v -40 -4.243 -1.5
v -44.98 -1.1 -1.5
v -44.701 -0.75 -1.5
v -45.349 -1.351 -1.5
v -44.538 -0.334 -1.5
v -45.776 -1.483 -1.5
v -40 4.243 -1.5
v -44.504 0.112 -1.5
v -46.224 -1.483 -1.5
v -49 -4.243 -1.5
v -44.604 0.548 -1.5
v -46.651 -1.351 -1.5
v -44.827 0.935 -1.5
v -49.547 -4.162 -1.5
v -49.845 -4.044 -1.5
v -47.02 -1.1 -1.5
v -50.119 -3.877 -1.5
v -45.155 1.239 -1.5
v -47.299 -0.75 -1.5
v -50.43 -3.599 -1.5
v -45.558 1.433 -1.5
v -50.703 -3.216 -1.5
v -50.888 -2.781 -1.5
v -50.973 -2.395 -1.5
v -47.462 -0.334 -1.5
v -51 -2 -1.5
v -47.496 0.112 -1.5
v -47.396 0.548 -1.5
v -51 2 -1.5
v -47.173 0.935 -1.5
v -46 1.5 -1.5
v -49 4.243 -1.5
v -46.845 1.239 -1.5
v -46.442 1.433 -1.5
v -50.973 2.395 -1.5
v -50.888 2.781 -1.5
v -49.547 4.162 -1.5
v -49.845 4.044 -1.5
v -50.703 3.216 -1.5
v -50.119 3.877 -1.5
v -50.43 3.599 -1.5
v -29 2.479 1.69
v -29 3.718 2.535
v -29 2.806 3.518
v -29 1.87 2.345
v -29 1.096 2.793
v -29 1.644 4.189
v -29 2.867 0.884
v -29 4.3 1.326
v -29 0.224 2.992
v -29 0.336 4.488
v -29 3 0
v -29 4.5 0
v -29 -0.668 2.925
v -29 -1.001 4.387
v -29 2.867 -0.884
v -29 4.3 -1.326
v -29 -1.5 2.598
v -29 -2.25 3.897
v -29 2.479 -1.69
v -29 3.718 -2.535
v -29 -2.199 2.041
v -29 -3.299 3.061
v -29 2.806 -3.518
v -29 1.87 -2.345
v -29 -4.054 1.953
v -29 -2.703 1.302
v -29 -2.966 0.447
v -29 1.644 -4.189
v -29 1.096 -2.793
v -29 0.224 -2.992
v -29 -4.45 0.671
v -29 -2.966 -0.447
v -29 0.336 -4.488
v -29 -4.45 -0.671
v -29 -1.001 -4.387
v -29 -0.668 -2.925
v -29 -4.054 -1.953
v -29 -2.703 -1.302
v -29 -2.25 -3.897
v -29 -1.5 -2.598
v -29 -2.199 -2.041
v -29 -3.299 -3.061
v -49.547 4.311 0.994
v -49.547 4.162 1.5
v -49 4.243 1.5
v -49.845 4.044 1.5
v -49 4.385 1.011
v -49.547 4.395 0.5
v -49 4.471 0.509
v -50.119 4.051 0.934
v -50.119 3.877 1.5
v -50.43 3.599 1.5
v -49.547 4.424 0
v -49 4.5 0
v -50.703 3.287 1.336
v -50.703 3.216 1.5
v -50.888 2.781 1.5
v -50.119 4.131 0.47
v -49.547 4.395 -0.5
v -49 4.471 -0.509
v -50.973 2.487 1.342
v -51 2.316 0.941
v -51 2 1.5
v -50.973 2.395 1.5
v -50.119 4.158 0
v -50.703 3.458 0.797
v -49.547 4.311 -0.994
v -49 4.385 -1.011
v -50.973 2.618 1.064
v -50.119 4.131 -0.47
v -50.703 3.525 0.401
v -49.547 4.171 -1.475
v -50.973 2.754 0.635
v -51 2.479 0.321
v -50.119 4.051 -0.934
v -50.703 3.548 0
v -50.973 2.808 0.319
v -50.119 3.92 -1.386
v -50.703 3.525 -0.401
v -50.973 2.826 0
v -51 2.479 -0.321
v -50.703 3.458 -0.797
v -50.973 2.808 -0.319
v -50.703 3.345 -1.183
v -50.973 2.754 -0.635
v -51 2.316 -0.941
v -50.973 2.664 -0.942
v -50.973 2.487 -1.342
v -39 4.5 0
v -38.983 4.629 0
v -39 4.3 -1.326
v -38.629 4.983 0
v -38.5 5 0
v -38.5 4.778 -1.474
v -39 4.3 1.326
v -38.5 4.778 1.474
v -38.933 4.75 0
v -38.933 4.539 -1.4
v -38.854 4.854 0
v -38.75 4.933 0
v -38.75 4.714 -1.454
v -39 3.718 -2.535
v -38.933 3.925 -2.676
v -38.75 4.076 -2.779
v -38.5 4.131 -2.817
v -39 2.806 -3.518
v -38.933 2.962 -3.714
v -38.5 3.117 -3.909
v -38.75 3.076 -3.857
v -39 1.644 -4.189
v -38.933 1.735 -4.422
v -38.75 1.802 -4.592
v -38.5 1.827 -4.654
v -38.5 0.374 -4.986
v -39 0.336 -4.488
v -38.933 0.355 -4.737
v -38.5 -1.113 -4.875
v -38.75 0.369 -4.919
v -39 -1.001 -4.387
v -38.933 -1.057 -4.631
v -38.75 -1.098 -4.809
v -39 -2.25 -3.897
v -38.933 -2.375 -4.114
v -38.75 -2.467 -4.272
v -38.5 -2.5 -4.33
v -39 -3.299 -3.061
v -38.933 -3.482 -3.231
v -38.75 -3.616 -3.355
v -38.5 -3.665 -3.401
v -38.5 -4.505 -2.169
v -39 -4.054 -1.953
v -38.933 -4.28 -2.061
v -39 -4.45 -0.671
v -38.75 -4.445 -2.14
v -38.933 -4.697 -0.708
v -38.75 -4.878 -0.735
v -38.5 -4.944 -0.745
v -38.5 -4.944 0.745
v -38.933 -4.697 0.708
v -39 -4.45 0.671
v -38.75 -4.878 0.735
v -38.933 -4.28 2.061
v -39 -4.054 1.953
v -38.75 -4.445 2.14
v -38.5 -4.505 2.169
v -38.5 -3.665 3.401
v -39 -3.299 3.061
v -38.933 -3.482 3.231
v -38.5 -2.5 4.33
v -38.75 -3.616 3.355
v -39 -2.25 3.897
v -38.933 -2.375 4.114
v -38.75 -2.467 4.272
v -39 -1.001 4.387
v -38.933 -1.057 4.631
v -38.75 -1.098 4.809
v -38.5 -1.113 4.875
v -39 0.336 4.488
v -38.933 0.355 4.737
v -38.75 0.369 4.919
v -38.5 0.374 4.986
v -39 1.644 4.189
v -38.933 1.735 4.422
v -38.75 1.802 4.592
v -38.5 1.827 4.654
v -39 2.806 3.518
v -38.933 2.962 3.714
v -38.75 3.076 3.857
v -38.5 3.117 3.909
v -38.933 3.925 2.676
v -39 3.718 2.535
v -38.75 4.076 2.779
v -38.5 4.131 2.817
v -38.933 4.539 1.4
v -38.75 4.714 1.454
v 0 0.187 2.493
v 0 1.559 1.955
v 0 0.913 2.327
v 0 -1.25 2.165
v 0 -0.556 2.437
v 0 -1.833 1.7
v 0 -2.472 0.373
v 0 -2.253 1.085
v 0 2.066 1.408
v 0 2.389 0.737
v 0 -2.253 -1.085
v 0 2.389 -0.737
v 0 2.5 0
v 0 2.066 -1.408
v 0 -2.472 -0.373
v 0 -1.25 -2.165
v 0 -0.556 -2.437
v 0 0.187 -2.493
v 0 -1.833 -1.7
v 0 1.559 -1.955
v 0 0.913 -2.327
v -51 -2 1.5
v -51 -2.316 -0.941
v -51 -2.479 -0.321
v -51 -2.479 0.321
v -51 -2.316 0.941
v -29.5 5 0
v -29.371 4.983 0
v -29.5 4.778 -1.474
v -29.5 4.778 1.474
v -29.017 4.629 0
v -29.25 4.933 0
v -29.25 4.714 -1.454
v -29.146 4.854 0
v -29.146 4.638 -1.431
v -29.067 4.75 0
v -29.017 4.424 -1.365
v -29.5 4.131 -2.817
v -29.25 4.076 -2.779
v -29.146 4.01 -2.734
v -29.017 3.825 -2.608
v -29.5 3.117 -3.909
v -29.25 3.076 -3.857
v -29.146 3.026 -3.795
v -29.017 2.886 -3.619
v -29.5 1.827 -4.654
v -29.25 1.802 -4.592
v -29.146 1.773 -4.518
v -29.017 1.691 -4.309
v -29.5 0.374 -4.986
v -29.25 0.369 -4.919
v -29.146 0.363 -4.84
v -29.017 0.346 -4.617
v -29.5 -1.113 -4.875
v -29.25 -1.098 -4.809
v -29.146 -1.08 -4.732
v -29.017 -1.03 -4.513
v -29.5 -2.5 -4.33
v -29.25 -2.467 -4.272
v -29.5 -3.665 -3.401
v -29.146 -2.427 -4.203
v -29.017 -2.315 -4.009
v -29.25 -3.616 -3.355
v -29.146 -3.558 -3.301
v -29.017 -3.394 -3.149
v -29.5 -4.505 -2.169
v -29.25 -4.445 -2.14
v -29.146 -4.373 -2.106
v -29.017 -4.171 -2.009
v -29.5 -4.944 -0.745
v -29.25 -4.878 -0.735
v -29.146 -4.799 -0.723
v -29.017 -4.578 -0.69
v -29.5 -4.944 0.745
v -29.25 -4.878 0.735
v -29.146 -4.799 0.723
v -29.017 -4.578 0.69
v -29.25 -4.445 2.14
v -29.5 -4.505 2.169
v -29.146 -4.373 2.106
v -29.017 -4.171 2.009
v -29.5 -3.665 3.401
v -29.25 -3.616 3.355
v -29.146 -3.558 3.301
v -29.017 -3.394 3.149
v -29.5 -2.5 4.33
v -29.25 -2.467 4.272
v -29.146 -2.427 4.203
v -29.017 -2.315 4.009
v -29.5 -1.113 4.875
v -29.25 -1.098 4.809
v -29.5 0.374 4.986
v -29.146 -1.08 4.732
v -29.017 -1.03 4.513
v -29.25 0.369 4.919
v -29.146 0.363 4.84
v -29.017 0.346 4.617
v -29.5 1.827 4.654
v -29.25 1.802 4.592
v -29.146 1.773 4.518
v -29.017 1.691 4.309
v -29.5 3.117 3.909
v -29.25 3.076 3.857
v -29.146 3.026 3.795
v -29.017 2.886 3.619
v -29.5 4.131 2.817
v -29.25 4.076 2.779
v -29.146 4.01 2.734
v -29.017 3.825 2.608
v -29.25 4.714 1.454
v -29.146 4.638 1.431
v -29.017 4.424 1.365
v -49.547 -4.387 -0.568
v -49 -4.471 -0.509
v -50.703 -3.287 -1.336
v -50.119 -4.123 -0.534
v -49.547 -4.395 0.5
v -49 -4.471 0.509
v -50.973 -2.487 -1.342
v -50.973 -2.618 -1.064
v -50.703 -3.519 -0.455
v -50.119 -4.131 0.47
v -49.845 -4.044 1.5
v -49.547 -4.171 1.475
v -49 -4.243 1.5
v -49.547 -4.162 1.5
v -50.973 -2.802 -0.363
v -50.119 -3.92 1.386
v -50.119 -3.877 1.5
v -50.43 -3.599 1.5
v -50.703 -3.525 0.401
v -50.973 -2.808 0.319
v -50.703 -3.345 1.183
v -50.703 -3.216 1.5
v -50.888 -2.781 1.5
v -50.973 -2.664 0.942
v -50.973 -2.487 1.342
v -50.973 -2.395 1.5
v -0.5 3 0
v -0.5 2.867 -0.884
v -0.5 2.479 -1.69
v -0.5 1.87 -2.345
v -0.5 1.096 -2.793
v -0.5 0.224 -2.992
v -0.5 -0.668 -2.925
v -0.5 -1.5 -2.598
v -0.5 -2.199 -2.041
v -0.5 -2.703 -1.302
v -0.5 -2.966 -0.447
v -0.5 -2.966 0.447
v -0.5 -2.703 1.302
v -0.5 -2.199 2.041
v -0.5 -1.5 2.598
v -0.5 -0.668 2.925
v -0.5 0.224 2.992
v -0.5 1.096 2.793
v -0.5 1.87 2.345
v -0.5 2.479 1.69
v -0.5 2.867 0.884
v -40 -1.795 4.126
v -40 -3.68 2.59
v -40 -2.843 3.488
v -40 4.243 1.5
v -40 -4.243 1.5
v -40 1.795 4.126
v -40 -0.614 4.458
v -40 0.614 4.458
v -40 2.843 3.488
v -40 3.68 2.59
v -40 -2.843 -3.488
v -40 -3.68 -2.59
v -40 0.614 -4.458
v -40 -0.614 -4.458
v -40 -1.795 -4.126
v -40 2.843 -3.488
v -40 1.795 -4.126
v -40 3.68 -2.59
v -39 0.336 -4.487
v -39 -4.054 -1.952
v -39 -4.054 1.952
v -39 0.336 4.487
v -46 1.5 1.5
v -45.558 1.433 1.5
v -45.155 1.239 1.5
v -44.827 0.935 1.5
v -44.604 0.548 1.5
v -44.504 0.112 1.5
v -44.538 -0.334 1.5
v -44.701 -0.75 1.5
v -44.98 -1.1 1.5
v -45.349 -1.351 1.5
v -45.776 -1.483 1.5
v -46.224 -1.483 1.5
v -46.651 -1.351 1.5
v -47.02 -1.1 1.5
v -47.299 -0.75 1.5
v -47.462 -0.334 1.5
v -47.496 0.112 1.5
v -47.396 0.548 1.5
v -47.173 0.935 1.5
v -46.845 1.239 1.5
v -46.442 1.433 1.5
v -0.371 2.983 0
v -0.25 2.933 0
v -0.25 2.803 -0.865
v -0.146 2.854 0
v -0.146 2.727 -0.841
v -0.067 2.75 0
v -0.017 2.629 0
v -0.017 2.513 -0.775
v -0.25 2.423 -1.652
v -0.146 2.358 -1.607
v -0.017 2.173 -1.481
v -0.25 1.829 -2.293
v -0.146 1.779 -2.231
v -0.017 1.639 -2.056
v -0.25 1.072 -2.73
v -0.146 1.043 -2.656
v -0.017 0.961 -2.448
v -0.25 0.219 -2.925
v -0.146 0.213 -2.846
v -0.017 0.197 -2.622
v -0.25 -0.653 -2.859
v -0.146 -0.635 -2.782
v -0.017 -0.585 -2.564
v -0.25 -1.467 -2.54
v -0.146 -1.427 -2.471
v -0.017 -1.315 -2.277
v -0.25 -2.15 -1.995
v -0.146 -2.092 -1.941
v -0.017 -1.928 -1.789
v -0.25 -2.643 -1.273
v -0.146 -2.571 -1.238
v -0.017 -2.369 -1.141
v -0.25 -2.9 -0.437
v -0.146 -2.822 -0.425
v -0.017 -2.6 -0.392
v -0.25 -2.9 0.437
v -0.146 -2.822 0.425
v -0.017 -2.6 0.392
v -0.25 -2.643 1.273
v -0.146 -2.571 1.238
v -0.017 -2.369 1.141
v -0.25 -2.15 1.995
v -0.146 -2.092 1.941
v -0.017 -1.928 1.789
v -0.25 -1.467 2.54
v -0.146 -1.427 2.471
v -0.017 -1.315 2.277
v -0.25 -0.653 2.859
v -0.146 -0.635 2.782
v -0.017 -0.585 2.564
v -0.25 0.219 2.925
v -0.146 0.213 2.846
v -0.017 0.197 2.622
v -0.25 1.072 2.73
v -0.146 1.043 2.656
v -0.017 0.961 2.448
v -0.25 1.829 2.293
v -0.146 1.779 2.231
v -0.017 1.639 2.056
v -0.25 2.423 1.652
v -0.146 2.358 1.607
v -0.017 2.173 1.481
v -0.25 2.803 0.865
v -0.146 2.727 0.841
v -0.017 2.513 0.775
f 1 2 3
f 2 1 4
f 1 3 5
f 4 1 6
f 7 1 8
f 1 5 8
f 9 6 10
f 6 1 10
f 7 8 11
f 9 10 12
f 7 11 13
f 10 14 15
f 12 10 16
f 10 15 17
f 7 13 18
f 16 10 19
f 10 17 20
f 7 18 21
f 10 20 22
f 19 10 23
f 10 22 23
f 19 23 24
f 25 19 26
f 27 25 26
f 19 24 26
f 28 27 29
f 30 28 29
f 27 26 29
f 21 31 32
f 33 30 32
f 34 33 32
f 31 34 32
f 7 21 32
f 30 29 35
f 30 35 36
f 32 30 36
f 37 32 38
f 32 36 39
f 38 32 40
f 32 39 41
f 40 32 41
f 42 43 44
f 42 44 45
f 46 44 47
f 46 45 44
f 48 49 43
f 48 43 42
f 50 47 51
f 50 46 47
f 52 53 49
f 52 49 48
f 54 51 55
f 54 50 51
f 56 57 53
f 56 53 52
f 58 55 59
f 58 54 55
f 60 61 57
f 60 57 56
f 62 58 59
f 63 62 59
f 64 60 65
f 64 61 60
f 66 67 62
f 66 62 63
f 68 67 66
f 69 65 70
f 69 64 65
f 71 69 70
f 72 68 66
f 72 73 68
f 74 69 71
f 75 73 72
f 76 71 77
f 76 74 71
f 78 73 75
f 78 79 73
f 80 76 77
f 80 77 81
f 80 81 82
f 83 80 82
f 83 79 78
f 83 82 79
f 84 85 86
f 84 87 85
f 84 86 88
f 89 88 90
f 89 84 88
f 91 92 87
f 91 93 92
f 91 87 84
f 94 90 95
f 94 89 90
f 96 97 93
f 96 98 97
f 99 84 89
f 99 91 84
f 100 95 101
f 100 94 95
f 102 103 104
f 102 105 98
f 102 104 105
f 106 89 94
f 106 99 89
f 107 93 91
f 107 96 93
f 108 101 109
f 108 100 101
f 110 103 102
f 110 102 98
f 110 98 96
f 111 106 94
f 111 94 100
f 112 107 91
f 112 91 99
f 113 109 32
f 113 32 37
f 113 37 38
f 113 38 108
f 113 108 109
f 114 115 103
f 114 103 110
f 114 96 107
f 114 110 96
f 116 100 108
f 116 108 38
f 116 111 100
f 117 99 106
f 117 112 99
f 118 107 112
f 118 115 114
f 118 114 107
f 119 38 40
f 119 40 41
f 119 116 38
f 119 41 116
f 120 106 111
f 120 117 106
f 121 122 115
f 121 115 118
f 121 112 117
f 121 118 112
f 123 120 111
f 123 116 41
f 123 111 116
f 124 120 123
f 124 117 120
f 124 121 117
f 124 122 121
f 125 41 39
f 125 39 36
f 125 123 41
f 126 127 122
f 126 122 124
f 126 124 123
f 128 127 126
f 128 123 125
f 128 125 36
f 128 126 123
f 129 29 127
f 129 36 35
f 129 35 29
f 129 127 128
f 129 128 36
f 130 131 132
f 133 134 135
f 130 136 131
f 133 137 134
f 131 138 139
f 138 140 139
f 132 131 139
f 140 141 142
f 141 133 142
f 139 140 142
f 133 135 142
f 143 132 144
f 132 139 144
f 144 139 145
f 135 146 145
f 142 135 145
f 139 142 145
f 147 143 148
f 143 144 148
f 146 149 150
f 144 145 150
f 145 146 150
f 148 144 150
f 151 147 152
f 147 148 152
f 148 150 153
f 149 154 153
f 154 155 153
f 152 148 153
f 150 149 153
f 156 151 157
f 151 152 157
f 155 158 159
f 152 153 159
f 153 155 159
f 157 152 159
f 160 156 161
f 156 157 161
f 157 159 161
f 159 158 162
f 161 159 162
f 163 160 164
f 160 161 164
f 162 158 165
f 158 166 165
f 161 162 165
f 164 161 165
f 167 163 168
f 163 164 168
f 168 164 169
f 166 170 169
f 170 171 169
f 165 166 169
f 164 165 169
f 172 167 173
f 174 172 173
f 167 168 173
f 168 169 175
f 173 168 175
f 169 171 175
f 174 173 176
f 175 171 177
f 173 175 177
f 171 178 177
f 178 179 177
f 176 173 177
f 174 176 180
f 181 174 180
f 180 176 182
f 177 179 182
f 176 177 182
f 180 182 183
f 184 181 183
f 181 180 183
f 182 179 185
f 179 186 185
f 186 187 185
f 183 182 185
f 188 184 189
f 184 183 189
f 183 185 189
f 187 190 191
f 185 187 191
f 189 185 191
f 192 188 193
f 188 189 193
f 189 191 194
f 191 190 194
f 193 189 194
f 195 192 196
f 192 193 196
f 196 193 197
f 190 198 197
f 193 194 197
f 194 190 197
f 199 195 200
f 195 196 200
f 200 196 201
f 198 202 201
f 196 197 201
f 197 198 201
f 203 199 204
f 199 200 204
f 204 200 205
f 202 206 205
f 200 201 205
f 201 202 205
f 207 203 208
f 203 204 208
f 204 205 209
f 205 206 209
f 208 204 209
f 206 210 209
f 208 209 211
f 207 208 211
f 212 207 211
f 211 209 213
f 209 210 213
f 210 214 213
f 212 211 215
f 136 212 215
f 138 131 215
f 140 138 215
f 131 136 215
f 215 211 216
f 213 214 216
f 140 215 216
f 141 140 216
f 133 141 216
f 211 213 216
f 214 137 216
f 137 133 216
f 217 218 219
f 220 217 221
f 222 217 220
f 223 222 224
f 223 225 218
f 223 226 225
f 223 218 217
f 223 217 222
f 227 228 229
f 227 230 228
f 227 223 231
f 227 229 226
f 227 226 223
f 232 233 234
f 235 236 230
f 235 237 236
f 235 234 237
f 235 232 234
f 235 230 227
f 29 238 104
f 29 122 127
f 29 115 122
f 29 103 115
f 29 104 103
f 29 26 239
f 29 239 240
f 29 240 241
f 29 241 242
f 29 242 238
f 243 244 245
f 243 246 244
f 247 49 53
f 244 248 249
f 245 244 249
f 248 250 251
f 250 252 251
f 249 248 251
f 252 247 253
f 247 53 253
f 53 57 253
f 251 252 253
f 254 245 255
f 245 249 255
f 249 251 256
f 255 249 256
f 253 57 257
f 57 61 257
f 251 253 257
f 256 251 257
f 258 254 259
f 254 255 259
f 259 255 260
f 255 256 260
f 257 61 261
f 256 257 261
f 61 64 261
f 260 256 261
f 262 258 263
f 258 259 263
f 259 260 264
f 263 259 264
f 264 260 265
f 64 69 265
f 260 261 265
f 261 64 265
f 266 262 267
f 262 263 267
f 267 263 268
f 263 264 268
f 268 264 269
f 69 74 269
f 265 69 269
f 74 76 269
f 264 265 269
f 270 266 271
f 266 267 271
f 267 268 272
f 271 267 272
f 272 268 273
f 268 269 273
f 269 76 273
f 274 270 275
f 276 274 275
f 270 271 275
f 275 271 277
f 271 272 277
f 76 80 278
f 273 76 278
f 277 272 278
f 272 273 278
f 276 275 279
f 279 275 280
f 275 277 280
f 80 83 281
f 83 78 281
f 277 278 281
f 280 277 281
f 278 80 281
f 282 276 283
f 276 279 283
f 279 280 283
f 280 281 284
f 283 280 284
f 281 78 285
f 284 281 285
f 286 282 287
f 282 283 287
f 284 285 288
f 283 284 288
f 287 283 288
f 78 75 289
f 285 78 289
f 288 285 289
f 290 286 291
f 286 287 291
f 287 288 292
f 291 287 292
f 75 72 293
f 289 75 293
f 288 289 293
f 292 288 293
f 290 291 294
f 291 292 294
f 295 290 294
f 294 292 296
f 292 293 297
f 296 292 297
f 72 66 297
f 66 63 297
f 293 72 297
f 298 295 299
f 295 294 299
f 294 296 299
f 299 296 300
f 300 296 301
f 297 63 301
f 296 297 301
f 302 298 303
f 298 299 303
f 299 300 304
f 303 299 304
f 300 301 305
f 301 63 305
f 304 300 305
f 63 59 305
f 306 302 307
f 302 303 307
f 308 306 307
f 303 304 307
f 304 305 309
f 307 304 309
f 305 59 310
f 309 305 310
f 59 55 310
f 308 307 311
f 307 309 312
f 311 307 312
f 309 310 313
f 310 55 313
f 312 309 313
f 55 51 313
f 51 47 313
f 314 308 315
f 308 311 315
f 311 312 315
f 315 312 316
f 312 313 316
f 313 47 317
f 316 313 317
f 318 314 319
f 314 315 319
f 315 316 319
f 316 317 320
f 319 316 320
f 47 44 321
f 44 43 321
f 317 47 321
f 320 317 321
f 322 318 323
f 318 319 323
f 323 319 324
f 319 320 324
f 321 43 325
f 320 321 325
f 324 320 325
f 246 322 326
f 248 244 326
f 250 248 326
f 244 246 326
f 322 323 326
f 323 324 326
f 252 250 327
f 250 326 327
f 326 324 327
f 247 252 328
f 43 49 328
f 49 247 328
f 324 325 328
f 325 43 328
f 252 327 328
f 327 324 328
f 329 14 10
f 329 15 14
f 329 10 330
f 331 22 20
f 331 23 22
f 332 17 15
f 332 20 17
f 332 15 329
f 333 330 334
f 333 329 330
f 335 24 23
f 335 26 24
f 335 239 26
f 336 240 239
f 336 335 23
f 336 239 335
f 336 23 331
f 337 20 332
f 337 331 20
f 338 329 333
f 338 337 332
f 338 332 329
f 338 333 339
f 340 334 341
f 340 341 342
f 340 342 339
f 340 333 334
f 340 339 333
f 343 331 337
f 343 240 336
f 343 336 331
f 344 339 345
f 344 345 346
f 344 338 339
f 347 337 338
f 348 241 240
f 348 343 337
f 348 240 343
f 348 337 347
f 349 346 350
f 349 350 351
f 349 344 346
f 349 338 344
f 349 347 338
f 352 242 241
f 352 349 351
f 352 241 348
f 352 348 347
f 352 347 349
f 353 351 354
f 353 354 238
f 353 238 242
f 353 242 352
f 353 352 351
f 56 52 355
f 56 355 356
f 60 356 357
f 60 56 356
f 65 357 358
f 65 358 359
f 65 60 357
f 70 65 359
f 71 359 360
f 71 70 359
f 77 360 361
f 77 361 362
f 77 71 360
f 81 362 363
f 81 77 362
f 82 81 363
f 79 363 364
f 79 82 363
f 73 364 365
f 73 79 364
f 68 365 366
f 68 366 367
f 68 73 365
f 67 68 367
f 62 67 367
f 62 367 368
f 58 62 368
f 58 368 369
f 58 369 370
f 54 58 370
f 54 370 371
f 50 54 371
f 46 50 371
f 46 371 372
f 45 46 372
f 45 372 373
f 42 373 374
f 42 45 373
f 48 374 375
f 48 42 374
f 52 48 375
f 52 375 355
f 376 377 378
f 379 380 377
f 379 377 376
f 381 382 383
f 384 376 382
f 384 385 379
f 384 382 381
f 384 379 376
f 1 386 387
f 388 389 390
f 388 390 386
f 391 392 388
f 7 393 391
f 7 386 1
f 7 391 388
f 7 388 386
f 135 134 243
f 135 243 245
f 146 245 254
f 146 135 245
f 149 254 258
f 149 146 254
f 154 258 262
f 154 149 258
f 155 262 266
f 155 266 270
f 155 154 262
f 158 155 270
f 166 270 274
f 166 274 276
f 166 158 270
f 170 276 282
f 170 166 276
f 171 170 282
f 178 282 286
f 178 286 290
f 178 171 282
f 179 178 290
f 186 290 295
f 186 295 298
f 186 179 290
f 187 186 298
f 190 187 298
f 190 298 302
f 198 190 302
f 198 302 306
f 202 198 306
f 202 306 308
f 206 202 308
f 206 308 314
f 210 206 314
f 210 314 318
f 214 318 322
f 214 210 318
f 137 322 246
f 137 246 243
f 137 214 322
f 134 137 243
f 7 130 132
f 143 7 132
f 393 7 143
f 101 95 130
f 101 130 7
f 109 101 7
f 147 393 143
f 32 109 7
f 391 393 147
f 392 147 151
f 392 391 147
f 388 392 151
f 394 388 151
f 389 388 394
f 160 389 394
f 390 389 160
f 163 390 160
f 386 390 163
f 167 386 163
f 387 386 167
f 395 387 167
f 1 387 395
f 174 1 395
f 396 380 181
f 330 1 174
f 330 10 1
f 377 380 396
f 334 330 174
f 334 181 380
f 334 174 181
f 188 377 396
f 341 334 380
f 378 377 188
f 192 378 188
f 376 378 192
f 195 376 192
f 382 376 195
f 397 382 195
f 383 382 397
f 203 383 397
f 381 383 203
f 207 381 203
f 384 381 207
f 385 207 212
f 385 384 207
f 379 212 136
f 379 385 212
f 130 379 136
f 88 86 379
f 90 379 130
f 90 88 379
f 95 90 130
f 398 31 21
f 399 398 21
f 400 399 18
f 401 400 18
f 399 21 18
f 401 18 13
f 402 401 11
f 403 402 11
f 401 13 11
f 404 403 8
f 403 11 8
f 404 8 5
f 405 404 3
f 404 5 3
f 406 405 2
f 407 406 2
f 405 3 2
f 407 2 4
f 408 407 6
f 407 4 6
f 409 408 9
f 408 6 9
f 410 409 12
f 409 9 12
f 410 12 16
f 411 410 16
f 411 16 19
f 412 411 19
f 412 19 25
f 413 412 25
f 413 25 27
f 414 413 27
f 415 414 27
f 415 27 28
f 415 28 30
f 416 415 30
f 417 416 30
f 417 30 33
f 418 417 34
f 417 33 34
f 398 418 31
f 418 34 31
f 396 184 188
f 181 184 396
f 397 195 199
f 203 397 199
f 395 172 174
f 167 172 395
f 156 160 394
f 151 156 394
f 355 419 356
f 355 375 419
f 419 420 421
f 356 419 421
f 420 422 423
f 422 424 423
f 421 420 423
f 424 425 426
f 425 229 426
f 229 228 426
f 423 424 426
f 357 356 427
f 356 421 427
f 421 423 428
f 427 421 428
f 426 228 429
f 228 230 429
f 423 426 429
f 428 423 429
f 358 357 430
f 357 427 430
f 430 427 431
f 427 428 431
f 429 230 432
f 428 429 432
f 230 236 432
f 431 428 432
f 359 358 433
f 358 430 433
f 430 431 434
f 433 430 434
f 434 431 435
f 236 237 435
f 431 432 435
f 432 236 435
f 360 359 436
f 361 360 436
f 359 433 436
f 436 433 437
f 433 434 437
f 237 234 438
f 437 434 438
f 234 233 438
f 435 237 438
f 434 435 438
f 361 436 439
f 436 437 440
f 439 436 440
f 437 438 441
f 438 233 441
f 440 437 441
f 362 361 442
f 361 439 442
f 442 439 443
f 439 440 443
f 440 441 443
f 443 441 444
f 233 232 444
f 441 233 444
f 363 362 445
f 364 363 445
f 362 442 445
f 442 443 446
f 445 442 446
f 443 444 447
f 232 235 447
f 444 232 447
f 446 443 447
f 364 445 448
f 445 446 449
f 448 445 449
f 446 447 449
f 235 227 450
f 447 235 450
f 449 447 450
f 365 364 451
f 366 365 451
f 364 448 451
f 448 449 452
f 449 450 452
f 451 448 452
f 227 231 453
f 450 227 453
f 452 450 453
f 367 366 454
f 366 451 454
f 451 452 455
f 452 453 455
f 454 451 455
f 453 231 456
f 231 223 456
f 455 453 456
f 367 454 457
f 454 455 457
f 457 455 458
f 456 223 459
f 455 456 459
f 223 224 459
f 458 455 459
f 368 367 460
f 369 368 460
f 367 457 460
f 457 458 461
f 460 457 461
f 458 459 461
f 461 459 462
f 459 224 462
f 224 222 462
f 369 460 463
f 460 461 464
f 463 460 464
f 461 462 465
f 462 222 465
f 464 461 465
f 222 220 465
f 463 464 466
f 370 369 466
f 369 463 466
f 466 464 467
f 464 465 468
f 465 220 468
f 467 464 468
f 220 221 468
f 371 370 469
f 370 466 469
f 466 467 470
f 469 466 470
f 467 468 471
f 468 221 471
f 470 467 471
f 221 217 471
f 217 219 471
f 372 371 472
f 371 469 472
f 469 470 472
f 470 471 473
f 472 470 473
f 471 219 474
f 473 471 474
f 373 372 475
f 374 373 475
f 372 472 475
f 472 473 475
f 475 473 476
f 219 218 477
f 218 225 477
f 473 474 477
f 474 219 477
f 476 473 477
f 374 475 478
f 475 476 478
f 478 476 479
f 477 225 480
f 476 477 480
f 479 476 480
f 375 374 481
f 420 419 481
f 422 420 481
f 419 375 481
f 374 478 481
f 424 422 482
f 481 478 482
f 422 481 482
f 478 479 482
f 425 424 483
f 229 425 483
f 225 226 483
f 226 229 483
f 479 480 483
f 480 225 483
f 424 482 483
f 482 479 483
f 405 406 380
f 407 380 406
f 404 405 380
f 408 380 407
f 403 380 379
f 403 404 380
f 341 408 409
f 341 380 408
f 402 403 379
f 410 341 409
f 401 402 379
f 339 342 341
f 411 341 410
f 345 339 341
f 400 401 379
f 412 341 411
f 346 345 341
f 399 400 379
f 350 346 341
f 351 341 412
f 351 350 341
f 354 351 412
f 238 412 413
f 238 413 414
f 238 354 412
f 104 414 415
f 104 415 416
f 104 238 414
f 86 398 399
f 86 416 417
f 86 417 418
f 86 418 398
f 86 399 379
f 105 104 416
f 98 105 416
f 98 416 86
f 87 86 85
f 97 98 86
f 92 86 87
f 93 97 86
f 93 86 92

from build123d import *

# Parameters (mm, degrees)
FILLET_1_R          = 2
SKETCH_2_R          = 7.321356554
SKETCH_2_W          = 3
SKETCH_2_H          = 11.961651185
CUT_EXTRUDE_1_DEPTH = 11
SKETCH_3_R          = 1.5
CUT_EXTRUDE_2_DEPTH = 3
FILLET_2_R          = 0.5


with BuildPart() as part:
    # 草图1 → 旋转1 (revolve)
    with BuildSketch(Plane.XY):
        Polygon((0, 0), (0, 3), (-29, 3), (-29, 5), (-39, 5), (-39, 4.5), (-51, 4.5), (-51, 0), align=None)
    revolve(axis=Axis((0, 0, 0), (-1, 0, 0)))

    # 圆角1
    fillet_1_edges = [part.edges().sort_by_distance(p)[0] for p in [
        (-51, -4.5, 0),
    ]]
    fillet(fillet_1_edges, radius=FILLET_1_R)

    # 草图2 → 切除-拉伸1 (cut)
    with BuildSketch(Plane.ZY.offset(51)):
        Circle(SKETCH_2_R)
        with Locations((0, -0.178000761)):
            Rectangle(SKETCH_2_W, SKETCH_2_H, mode=Mode.SUBTRACT)
    extrude(amount=-CUT_EXTRUDE_1_DEPTH, mode=Mode.SUBTRACT)

    # 草图3 → 切除-拉伸2 (cut)
    with BuildSketch(Plane(origin=(0, 0, -1.5), x_dir=(-1, 0, 0), z_dir=(0, 0, -1))):
        with Locations(Location((46, 0, 0), (0, 0, 90))):
            Circle(SKETCH_3_R)
    extrude(amount=-CUT_EXTRUDE_2_DEPTH, mode=Mode.SUBTRACT)

    # 圆角2
    fillet_2_edges = [part.edges().sort_by_distance(p)[0] for p in [
        (-39, -5, 0),
        (-29, -5, 0),
        (0, -3, 0),
    ]]
    fillet(fillet_2_edges, radius=FILLET_2_R - 0.0001)  # a hair under: the kernel refuses the full size


solid = part.part
